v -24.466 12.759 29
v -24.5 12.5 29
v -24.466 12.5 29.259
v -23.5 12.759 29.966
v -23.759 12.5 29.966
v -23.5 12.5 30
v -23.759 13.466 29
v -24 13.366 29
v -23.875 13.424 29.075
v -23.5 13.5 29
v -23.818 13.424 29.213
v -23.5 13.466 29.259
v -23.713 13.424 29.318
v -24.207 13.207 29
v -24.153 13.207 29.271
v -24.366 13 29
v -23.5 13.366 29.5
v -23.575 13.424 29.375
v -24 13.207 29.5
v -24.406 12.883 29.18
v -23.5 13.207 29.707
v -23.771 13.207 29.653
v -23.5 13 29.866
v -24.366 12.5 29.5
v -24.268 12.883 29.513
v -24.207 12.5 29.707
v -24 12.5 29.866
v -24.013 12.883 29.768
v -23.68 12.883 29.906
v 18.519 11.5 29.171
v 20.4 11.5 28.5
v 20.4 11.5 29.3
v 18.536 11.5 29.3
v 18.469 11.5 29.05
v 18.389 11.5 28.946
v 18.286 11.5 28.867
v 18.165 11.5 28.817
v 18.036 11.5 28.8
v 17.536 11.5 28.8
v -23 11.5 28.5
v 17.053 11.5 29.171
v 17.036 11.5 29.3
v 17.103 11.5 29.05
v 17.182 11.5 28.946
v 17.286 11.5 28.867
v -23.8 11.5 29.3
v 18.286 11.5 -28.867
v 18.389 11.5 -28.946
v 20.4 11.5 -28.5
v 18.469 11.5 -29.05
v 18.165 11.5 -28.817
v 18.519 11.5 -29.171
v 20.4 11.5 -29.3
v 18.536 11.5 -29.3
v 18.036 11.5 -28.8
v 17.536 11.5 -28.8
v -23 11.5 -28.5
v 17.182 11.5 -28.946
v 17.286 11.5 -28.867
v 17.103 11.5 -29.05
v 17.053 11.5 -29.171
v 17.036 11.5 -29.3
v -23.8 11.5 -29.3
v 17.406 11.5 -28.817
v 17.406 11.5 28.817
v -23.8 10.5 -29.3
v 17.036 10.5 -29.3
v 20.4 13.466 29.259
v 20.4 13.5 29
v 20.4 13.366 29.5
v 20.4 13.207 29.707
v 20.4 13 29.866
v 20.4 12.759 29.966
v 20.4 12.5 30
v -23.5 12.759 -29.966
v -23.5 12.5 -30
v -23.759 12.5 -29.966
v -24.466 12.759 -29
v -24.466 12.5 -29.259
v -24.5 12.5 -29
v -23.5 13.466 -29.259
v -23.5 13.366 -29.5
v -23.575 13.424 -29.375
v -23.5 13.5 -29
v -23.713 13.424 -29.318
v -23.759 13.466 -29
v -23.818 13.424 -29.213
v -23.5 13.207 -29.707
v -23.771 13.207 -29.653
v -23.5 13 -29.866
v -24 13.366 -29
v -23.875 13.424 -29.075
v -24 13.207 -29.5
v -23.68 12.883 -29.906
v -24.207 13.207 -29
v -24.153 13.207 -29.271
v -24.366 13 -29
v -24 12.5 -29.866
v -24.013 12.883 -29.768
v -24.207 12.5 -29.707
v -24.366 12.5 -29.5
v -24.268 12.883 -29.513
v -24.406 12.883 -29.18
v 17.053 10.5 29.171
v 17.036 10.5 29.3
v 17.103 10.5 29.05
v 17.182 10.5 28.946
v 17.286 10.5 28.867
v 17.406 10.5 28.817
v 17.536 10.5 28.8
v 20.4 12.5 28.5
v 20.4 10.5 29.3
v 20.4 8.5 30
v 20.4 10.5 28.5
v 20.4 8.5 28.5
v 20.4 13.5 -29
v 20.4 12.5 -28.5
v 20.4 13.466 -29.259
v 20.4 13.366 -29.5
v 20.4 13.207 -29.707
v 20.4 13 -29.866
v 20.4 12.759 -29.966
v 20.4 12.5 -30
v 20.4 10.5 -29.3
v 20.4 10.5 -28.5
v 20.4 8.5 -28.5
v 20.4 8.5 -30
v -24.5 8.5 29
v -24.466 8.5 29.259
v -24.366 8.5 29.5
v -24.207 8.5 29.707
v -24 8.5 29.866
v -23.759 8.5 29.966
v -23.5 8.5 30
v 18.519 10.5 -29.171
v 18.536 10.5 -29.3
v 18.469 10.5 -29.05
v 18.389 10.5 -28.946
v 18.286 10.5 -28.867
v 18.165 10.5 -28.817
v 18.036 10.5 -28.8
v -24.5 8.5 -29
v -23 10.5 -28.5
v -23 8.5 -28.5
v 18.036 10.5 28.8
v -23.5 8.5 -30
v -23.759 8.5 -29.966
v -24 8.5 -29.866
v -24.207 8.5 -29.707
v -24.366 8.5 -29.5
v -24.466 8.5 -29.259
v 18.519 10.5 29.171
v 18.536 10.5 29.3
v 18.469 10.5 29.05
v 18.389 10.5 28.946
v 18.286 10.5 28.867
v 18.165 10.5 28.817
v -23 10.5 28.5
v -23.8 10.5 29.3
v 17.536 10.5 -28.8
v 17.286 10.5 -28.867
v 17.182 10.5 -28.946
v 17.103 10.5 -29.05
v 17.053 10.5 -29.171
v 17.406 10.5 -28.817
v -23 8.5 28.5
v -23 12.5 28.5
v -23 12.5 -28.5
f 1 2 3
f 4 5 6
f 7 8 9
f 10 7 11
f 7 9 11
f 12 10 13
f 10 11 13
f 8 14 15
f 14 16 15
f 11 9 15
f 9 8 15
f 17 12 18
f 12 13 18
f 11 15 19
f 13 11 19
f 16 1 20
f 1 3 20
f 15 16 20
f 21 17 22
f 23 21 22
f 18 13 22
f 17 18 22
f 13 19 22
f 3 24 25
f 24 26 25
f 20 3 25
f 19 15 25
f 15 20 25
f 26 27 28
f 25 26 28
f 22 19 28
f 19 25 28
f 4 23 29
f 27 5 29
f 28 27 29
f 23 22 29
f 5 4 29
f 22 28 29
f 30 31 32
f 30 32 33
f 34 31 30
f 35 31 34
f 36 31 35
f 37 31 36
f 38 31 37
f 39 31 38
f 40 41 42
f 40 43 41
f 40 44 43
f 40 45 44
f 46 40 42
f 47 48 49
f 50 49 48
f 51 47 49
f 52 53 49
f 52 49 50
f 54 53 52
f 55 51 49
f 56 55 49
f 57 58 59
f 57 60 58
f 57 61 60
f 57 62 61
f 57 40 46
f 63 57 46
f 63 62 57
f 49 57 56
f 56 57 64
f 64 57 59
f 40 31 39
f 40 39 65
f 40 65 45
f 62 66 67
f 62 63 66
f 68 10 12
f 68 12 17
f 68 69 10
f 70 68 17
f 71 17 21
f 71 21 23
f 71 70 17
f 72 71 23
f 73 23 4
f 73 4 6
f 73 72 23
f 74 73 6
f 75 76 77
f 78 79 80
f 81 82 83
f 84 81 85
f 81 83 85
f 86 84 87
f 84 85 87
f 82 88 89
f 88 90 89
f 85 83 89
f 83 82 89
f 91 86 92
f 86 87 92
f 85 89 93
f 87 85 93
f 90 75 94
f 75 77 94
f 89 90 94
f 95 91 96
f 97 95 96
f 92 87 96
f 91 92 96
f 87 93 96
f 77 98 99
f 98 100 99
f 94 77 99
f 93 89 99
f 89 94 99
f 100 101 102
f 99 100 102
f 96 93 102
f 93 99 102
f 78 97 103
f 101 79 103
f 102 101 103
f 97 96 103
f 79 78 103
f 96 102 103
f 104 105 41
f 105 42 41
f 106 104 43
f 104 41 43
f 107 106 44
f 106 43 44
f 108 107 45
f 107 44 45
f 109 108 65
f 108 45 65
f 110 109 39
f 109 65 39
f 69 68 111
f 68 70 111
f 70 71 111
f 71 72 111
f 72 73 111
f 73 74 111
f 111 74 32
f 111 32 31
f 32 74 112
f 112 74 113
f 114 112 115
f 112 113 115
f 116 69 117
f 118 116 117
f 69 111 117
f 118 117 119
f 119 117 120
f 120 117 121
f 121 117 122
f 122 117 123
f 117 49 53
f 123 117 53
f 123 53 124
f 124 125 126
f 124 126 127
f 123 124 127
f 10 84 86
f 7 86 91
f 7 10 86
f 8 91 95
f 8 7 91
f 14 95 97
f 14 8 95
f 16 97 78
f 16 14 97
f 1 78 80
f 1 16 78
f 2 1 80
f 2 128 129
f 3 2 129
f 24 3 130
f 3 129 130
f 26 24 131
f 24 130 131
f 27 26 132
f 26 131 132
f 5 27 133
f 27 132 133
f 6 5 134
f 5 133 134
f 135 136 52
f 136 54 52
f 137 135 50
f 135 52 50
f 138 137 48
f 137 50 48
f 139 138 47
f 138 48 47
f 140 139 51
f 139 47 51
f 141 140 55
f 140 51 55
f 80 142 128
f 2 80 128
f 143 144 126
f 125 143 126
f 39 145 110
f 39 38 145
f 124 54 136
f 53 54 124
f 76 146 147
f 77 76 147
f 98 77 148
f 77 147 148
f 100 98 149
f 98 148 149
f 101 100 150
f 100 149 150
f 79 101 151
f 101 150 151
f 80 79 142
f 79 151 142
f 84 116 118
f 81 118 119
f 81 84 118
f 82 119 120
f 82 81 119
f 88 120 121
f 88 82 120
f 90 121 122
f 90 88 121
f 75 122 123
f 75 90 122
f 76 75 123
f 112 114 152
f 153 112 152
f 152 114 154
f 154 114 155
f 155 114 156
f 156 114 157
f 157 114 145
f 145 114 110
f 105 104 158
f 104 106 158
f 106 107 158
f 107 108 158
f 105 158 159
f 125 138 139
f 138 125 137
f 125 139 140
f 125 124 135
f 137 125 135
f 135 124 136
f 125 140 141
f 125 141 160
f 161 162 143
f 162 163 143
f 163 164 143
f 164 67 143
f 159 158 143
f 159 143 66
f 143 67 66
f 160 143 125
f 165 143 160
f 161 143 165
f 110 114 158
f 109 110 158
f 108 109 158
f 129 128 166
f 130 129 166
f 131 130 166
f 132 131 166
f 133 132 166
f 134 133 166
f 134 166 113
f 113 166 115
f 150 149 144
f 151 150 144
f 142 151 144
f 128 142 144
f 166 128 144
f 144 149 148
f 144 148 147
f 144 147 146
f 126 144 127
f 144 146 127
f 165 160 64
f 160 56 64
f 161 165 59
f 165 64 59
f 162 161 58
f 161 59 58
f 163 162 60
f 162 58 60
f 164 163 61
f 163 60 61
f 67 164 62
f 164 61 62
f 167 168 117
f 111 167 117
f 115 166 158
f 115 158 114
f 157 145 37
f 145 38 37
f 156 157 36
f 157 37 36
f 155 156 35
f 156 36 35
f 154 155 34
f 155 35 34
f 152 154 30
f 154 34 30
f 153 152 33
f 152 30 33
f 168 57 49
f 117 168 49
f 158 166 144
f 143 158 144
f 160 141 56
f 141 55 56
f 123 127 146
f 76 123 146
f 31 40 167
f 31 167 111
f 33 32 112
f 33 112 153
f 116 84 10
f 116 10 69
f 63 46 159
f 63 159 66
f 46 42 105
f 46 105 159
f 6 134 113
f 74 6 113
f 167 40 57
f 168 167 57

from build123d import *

# Parameters (mm, degrees)
BOSS_EXTRUDE1_DEPTH  = 5
SKETCH1_3_W          = 43.4
SKETCH1_3_H          = 57
CUT_EXTRUDE1_DEPTH   = 4
SKETCH4_W            = 43.4
SKETCH4_H            = 1
CUT_EXTRUDE2_DEPTH   = 0.8
SKETCH5_W            = 43.4
SKETCH5_H            = 1
CUT_EXTRUDE3_DEPTH   = 0.8
SKETCH6_W            = 58.6
SKETCH6_H            = 1
CUT_EXTRUDE4_DEPTH   = 0.8
FILLET1_R            = 1
SKETCH8_W            = 1.5
SKETCH8_H            = 1
BOSS_EXTRUDE2_DEPTH  = 0.5
FILLET2_R            = 0.5
FILLET2_OF_MIRROR1_R = 0.5


# Read off the part's stored shape, not the designer's step: Boss-Extrude1
with BuildPart() as part:
    # Boss-Extrude1 outline → Boss-Extrude1 (new body)
    with BuildSketch(Plane(origin=(0, 8.5, 0), x_dir=(1, 0, 0), z_dir=(0, 1, 0))):
        with BuildLine():
            Line((-23.5, -30), (20.4, -30))
            Line((20.4, -30), (20.4, 30))
            Line((20.4, 30), (-23.5, 30))
            ThreePointArc((-23.5, 30), (-24.207106781, 29.707106781), (-24.5, 29))
            Line((-24.5, 29), (-24.5, -29))
            ThreePointArc((-24.5, -29), (-24.207106781, -29.707106781), (-23.5, -30))
        make_face()
    extrude(amount=BOSS_EXTRUDE1_DEPTH)

    # Sketch1<3> → Cut-Extrude1 (cut)
    with BuildSketch(Plane(origin=(0, 8.5, 0), x_dir=(1, 0, 0), z_dir=(0, 1, 0))):
        with Locations((-1.3, 0)):
            Rectangle(SKETCH1_3_W, SKETCH1_3_H)
    extrude(amount=CUT_EXTRUDE1_DEPTH, mode=Mode.SUBTRACT)

    # Sketch4 → Cut-Extrude2 (cut)
    with BuildSketch(Plane.XY.offset(-28.5)):
        with Locations((-1.3, 11)):
            Rectangle(SKETCH4_W, SKETCH4_H)
    extrude(amount=-CUT_EXTRUDE2_DEPTH, mode=Mode.SUBTRACT)

    # Sketch5 → Cut-Extrude3 (cut)
    with BuildSketch(Plane(origin=(0, 0, 28.5), x_dir=(-1, 0, 0), z_dir=(0, 0, -1))):
        with Locations((1.3, 11)):
            Rectangle(SKETCH5_W, SKETCH5_H)
    extrude(amount=-CUT_EXTRUDE3_DEPTH, mode=Mode.SUBTRACT)

    # Sketch6 → Cut-Extrude4 (cut)
    with BuildSketch(Plane(origin=(-23, 0, 0), x_dir=(0, 0, -1), z_dir=(1, 0, 0))):
        with Locations((0, 11)):
            Rectangle(SKETCH6_W, SKETCH6_H)
    extrude(amount=-CUT_EXTRUDE4_DEPTH, mode=Mode.SUBTRACT)

    # Fillet1
    fillet1_edges = [part.edges().sort_by_distance(p)[0] for p in [
        (-1.55, 13.5, -30),
        (-24.207106781, 13.5, -29.707106781),
        (-24.5, 13.5, 0),
        (-24.207106781, 13.5, 29.707106781),
        (-1.55, 13.5, 30),
    ]]
    fillet(fillet1_edges, radius=FILLET1_R)

    # Sketch8 → Boss-Extrude2 (add)
    with BuildSketch(Plane(origin=(0, 0, 29.3), x_dir=(-1, 0, 0), z_dir=(0, 0, -1))):
        with Locations((-17.785673559, 11)):
            Rectangle(SKETCH8_W, SKETCH8_H)
    boss_extrude2 = extrude(amount=BOSS_EXTRUDE2_DEPTH)

    # Fillet2
    fillet2_edges = [part.edges().sort_by_distance(p)[0] for p in [
        (18.535673559, 11, 28.8),
        (17.035673559, 11, 28.8),
    ]]
    fillet(fillet2_edges, radius=FILLET2_R - 0.0001)  # a hair under: the kernel refuses the full size

    # Mirror1: Boss-Extrude2 across plane
    add(boss_extrude2.mirror(Plane(origin=(0, 0, 0), x_dir=(1, 0, 0), z_dir=(0, 0, -1))))

    # Fillet2 of Mirror1
    fillet2_of_mirror1_edges = [part.edges().sort_by_distance(p)[0] for p in [
        (18.535673559, 11, -28.8),
        (17.035673559, 11, -28.8),
    ]]
    fillet(fillet2_of_mirror1_edges, radius=FILLET2_OF_MIRROR1_R - 0.0001)  # a hair under: the kernel refuses the full size


solid = part.part
